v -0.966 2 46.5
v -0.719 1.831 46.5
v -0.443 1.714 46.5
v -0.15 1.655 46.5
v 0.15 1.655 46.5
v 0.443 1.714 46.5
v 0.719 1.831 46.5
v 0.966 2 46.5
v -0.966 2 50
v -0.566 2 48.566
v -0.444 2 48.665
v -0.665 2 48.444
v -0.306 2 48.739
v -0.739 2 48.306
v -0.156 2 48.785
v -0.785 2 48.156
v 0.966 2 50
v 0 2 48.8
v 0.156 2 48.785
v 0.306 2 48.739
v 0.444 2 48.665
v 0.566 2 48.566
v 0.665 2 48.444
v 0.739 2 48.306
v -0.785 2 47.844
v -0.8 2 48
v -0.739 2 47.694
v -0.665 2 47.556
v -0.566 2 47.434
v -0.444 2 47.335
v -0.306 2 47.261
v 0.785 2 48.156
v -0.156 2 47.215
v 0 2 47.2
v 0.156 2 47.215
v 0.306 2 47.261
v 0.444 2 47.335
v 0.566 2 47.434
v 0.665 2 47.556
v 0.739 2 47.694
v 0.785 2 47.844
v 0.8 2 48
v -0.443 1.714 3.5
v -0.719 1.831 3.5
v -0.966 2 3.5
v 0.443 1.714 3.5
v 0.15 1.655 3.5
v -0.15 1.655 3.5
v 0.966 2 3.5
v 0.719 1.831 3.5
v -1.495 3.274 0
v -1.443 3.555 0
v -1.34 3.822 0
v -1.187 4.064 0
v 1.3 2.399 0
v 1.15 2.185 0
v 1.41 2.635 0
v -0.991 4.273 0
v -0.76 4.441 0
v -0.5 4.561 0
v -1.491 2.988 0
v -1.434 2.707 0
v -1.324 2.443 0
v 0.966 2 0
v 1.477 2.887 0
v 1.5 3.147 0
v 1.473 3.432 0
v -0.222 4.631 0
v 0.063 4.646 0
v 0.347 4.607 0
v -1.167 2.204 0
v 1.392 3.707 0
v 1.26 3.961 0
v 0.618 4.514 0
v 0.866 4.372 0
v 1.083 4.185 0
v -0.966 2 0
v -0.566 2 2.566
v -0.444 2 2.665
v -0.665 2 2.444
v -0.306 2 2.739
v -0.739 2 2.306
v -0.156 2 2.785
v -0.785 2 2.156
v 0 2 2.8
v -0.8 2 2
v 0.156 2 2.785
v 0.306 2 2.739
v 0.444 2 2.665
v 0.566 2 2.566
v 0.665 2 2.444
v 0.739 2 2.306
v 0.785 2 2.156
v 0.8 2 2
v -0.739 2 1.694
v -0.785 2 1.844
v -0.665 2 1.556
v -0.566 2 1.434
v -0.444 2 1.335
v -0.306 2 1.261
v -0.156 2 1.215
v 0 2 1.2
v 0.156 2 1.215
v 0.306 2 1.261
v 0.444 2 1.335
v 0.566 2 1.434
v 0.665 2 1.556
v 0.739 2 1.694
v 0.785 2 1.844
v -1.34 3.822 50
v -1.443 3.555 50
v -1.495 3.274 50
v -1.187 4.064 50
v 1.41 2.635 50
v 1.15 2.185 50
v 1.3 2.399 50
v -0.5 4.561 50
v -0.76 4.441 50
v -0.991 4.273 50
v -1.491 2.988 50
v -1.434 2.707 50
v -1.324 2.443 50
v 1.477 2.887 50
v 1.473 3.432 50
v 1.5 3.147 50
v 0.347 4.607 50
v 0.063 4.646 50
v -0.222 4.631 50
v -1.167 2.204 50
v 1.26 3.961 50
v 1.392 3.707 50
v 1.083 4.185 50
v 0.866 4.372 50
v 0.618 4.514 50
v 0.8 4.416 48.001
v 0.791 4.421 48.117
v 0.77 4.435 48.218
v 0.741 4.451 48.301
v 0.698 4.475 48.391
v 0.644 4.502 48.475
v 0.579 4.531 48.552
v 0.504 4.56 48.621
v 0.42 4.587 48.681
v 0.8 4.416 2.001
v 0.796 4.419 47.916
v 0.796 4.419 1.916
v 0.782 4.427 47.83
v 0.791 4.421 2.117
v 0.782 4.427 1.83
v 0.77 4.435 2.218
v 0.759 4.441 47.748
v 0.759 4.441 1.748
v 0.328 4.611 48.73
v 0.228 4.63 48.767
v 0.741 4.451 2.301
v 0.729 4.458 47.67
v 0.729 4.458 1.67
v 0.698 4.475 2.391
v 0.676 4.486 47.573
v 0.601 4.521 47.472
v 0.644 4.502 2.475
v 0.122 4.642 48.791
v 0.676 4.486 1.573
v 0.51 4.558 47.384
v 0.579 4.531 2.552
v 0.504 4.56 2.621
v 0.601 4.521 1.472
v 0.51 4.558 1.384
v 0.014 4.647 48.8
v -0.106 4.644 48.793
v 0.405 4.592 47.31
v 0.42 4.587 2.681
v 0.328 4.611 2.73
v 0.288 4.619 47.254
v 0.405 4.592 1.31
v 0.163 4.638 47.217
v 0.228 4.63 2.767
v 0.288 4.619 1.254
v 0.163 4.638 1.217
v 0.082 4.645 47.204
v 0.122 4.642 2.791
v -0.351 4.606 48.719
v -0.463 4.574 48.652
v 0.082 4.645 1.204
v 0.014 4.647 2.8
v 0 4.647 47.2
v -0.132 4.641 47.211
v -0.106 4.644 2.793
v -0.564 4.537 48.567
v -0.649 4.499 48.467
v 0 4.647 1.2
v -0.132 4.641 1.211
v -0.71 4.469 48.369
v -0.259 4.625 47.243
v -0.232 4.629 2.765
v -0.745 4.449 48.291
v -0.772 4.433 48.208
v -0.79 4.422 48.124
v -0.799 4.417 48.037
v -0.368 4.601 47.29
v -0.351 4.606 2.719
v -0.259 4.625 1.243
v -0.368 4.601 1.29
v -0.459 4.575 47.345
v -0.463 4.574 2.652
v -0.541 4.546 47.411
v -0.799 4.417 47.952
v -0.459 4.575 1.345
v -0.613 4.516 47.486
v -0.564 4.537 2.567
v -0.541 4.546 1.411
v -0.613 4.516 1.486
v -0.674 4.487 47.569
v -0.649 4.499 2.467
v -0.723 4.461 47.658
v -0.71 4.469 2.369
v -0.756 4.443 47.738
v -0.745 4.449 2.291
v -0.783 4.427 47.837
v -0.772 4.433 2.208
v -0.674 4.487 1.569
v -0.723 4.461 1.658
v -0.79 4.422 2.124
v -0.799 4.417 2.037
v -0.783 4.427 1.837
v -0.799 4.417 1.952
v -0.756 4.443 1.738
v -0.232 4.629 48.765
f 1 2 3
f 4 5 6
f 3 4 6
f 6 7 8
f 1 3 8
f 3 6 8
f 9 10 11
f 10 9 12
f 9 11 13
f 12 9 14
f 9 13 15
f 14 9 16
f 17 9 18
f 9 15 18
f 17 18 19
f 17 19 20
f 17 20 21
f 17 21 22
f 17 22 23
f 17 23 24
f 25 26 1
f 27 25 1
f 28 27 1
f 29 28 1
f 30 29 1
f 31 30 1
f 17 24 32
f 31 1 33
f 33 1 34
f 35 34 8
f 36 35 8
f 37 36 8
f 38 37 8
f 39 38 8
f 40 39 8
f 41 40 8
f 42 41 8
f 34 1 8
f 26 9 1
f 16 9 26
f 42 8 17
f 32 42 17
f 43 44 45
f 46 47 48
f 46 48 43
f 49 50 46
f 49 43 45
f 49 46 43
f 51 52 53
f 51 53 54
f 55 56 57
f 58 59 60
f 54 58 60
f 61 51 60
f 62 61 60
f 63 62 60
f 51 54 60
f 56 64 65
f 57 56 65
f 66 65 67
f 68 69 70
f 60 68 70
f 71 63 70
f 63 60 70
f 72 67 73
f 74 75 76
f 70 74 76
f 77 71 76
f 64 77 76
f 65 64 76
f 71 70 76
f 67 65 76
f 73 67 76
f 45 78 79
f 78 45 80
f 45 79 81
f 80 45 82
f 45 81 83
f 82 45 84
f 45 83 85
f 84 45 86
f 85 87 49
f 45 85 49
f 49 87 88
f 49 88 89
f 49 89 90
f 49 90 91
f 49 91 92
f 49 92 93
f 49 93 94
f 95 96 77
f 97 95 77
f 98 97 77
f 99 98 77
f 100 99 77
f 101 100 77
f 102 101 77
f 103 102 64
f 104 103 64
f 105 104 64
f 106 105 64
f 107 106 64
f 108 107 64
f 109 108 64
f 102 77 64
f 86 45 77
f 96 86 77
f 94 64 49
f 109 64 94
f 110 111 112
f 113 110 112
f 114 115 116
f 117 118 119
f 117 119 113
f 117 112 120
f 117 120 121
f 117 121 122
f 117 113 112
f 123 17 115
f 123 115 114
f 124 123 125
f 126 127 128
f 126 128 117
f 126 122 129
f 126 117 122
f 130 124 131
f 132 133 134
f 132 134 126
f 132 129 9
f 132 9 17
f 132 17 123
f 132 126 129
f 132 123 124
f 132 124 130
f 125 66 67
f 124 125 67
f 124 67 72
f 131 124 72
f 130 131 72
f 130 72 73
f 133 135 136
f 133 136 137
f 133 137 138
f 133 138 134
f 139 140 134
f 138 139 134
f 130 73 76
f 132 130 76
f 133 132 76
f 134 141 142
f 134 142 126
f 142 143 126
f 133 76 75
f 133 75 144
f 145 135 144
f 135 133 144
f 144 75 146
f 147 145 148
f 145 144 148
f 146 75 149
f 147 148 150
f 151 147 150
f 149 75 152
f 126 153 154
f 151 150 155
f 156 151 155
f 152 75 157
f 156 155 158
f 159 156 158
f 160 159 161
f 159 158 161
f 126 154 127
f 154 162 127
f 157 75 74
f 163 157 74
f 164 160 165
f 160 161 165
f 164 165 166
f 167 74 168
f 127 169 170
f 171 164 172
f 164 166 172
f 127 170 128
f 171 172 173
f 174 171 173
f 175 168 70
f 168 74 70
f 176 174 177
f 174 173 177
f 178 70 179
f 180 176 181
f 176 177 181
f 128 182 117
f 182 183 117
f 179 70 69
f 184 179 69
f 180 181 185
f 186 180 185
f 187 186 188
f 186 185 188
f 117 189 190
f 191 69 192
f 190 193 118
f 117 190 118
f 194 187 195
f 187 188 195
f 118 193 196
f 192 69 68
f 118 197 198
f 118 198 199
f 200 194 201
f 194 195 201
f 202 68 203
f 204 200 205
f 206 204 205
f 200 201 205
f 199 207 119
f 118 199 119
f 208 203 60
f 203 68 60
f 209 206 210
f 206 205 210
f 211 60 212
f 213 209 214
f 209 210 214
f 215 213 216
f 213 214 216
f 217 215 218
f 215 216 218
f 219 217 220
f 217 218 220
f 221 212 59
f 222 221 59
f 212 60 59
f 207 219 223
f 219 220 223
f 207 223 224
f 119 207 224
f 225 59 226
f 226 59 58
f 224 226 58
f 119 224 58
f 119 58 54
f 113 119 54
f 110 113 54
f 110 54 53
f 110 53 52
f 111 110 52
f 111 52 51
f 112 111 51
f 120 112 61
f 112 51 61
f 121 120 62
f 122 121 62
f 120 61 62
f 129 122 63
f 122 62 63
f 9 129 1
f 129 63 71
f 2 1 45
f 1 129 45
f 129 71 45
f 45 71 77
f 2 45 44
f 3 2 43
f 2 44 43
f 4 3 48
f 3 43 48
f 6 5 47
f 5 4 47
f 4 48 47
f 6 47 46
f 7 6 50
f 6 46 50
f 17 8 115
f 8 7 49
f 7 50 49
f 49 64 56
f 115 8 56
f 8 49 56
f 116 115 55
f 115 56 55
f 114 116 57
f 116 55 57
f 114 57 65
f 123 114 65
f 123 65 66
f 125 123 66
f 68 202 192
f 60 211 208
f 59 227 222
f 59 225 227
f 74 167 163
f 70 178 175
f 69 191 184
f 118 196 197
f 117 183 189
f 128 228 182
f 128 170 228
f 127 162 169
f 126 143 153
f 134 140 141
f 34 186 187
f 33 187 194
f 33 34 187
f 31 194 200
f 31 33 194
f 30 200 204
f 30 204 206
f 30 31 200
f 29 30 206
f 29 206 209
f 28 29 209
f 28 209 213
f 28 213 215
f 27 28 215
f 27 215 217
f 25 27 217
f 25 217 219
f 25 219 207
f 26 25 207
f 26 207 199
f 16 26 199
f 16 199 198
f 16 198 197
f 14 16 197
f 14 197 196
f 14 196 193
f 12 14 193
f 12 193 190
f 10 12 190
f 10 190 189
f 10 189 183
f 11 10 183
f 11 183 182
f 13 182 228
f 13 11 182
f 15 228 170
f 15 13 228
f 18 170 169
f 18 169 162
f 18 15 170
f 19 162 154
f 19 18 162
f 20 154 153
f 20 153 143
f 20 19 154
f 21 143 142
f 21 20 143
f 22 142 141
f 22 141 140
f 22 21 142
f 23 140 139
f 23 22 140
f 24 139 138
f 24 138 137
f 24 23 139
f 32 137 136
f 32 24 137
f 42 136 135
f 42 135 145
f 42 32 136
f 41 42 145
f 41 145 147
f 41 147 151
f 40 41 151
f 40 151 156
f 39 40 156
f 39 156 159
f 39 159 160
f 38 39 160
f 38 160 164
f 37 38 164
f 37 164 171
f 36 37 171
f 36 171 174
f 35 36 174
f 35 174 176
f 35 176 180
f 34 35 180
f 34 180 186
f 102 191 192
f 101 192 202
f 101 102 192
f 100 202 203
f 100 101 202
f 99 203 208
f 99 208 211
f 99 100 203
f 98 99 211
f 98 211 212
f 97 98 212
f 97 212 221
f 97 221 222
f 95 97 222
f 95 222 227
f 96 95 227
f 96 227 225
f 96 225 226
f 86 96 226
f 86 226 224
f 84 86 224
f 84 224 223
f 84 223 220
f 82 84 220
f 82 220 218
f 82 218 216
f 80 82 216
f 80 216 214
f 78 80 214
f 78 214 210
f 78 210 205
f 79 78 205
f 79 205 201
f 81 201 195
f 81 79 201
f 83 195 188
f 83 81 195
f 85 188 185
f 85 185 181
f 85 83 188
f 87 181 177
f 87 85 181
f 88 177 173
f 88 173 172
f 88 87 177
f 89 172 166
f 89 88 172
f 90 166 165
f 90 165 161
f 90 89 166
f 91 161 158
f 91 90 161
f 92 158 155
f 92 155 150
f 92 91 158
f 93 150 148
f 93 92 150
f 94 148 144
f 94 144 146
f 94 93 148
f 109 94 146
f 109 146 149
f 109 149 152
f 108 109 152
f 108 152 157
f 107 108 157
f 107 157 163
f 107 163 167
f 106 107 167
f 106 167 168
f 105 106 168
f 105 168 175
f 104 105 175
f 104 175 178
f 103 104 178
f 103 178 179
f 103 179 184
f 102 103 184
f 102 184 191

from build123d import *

# Parameters (mm, degrees)
SKETCH1_R               = 1.5
BOSS_EXTRUDE1_DEPTH     = 50
CUT_EXTRUDE1_DEPTH      = 2
CUT_EXTRUDE1_DEPTH_BACK = 50
SKETCH3_W               = 2
SKETCH3_H               = 4.5
CUT_EXTRUDE2_DEPTH      = 50
CUT_EXTRUDE2_DEPTH_BACK = 50
SKETCH4_R               = 0.8


with BuildPart() as part:
    # Sketch1 → Boss-Extrude1 (new body)
    with BuildSketch(Plane.XY):
        with Locations((0, 3.147273027)):
            Circle(SKETCH1_R)
    extrude(amount=BOSS_EXTRUDE1_DEPTH)

    # Sketch3 → Cut-Extrude1 (cut, two sides: drawn at the far end of the back side and taken through both)
    with BuildSketch(Plane(origin=(0, 0, 0), x_dir=(1, 0, 0), z_dir=(0, 1, 0)).offset(-CUT_EXTRUDE1_DEPTH_BACK)):
        with Locations((0, -48.75)):
            Rectangle(SKETCH3_W, SKETCH3_H)
        with Locations((0, -1.25)):
            Rectangle(SKETCH3_W, SKETCH3_H)
    extrude(amount=CUT_EXTRUDE1_DEPTH + CUT_EXTRUDE1_DEPTH_BACK, mode=Mode.SUBTRACT)

    # Sketch4 → Cut-Extrude2 (cut, two sides: drawn at the far end of the back side and taken through both)
    with BuildSketch(Plane(origin=(0, 0, 0), x_dir=(1, 0, 0), z_dir=(0, 1, 0)).offset(-CUT_EXTRUDE2_DEPTH_BACK)):
        with Locations(Location((0, -48, 0), (0, 0, 90))):
            Circle(SKETCH4_R)
        with Locations(Location((0, -2, 0), (0, 0, 90))):
            Circle(SKETCH4_R)
    extrude(amount=CUT_EXTRUDE2_DEPTH + CUT_EXTRUDE2_DEPTH_BACK, mode=Mode.SUBTRACT)


solid = part.part
